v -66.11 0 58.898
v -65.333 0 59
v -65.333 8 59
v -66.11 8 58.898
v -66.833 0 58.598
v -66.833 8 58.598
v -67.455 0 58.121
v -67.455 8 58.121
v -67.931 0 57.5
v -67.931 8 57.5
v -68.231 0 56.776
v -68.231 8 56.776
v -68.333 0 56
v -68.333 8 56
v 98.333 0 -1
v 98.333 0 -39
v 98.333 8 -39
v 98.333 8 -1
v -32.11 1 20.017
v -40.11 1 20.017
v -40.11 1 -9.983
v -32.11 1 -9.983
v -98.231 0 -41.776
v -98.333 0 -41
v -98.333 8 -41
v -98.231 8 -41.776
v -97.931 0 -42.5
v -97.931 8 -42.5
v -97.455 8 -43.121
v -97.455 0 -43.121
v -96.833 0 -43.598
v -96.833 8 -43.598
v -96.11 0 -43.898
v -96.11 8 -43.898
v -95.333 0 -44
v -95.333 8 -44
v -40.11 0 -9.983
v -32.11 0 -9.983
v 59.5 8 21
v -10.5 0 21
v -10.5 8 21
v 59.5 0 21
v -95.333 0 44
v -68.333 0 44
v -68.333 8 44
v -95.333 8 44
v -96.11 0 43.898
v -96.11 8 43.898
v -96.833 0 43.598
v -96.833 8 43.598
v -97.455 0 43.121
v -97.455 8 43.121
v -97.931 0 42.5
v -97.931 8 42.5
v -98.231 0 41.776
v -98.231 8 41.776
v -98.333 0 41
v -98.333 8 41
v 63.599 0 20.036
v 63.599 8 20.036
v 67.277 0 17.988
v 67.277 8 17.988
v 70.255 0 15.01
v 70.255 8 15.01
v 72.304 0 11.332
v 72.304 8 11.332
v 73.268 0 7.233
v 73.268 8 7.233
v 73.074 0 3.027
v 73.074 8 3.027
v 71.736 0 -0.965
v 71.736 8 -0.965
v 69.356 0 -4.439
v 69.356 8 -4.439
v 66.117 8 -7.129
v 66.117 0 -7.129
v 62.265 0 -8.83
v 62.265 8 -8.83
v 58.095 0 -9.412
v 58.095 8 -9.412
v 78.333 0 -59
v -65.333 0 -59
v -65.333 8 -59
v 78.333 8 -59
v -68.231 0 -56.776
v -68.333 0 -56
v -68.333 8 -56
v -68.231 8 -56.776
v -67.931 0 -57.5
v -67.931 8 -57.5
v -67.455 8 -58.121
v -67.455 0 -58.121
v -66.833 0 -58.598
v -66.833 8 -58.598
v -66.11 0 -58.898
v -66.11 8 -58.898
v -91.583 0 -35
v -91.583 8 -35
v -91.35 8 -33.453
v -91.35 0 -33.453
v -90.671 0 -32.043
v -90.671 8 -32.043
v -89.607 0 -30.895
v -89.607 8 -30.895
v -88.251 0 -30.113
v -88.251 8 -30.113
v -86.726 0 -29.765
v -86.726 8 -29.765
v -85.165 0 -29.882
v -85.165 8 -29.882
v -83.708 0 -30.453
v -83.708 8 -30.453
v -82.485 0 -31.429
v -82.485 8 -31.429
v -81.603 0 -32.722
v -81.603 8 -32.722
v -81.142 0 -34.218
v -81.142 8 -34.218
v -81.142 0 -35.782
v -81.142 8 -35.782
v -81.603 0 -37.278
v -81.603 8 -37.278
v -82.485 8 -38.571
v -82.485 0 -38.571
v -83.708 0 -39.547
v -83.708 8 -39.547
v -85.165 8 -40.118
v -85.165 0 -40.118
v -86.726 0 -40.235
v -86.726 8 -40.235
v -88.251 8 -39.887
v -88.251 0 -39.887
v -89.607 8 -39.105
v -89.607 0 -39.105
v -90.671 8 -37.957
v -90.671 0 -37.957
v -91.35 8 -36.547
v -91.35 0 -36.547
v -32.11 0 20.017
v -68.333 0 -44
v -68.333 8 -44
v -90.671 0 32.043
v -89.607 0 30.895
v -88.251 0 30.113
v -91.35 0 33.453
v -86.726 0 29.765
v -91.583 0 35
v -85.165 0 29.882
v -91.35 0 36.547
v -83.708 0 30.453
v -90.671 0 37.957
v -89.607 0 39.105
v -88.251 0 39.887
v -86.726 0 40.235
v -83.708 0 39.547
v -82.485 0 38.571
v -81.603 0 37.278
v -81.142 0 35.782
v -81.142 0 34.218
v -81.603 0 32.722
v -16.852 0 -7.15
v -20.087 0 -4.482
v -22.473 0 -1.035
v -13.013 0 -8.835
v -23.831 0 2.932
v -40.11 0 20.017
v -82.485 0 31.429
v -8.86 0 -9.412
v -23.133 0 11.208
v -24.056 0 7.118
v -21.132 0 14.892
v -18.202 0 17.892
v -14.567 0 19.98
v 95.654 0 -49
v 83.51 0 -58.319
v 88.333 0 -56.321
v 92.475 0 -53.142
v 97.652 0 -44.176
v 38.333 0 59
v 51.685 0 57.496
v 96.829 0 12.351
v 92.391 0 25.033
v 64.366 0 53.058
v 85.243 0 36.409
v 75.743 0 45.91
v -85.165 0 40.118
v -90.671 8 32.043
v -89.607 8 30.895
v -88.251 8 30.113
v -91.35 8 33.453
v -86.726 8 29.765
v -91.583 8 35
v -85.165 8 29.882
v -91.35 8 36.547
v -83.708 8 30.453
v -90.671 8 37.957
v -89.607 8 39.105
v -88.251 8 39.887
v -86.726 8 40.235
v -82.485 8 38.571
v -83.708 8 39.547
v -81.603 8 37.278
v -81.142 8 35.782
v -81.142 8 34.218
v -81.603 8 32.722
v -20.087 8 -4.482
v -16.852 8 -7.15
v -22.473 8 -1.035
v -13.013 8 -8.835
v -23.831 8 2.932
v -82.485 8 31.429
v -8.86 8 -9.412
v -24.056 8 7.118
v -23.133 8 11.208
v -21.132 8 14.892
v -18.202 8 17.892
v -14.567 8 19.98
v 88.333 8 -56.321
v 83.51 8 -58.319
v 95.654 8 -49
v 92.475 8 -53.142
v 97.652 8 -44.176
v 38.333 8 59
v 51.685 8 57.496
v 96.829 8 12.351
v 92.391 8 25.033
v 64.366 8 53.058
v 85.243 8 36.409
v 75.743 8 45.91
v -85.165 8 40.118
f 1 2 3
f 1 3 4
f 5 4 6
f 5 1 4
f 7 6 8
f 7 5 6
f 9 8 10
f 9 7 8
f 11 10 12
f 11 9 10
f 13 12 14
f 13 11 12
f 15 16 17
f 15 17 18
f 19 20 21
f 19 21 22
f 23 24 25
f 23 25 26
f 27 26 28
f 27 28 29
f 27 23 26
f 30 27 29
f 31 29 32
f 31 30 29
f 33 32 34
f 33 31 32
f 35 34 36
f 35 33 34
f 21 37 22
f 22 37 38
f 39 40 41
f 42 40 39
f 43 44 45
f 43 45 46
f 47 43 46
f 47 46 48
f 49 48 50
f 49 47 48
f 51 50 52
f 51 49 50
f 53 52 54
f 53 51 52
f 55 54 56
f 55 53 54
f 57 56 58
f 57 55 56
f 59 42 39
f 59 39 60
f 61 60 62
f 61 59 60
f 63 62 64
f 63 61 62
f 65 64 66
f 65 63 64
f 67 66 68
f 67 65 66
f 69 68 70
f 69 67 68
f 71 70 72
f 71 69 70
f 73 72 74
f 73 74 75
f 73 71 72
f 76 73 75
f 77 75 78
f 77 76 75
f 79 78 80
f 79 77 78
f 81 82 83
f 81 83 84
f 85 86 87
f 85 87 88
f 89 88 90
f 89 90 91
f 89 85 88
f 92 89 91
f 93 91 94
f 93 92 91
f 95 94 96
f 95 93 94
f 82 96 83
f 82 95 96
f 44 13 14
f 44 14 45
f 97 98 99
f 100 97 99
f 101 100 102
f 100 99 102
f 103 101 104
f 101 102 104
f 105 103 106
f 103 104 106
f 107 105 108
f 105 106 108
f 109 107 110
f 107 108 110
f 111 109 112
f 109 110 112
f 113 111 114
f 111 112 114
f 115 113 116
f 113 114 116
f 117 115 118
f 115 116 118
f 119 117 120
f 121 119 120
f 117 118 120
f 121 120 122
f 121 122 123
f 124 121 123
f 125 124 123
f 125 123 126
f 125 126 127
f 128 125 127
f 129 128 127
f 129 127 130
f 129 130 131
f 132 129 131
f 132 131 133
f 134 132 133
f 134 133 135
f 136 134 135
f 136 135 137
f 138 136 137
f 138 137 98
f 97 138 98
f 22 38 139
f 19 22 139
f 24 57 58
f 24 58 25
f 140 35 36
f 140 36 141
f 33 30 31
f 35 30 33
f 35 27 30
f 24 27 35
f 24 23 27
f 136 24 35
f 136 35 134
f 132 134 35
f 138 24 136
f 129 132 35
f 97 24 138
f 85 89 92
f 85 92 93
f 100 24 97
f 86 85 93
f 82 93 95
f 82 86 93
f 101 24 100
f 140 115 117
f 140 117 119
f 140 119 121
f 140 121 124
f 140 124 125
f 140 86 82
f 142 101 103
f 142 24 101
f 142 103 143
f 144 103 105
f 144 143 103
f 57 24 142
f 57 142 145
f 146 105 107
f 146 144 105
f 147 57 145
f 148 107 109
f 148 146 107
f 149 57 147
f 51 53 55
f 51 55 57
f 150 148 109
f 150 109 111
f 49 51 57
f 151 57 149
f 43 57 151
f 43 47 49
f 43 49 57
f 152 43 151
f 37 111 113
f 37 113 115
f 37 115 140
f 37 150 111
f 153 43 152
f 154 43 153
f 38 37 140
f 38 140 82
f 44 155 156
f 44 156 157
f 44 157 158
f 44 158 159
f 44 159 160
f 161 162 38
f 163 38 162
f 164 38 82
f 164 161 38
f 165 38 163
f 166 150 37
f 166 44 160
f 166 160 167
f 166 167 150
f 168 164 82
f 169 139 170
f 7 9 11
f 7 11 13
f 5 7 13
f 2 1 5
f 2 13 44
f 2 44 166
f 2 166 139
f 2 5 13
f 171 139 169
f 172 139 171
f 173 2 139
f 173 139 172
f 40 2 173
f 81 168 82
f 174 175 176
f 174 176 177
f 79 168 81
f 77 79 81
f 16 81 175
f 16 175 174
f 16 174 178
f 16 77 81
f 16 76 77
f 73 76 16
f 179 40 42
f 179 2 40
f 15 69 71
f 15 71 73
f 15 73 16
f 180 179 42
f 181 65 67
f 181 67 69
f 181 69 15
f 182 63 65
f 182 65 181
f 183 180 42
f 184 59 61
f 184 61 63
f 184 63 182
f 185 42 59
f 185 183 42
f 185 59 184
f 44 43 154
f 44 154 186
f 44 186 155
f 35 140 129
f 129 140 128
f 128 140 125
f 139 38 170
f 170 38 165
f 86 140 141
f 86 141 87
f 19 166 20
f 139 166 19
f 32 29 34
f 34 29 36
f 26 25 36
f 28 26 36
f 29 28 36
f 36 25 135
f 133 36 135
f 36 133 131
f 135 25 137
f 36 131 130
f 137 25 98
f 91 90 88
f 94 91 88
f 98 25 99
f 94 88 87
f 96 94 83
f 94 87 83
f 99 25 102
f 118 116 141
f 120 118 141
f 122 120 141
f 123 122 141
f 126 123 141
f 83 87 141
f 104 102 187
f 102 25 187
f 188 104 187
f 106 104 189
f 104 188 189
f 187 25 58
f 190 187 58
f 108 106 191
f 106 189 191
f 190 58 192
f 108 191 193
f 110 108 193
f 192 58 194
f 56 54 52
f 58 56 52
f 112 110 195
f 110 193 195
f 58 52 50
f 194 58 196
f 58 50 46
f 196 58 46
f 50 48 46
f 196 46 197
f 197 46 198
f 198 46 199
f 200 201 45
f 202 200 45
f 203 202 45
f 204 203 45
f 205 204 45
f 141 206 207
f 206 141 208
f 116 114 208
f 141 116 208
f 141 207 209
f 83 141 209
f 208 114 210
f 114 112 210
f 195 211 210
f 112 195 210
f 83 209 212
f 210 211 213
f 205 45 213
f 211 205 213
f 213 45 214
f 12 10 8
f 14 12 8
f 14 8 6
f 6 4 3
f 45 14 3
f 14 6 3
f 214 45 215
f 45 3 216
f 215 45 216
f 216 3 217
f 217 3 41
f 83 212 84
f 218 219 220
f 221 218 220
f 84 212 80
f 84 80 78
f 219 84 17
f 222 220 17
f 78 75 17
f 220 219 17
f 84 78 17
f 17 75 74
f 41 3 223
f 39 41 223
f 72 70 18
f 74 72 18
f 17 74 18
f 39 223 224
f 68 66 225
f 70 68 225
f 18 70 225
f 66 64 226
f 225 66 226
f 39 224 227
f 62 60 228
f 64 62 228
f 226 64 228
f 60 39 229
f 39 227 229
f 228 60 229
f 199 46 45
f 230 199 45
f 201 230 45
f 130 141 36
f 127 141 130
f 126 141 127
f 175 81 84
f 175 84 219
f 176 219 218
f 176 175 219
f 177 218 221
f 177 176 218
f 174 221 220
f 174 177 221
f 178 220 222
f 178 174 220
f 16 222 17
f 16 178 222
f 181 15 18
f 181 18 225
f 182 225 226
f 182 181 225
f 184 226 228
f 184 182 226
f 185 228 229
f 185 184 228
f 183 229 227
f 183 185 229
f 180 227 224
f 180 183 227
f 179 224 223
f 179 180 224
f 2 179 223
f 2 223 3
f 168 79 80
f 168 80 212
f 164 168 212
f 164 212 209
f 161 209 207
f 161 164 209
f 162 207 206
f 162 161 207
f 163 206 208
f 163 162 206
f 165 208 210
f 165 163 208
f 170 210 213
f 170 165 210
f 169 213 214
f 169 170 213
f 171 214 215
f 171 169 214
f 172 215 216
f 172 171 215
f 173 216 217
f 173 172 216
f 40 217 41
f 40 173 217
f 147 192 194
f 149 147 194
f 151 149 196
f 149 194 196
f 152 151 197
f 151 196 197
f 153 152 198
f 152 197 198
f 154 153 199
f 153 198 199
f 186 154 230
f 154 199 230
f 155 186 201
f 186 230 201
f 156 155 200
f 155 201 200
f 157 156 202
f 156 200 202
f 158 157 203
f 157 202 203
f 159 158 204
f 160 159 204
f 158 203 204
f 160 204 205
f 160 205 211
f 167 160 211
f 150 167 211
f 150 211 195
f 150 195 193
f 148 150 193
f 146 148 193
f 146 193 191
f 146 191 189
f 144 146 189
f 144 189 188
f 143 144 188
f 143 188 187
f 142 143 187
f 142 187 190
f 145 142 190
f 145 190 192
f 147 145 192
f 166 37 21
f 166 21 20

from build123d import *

# Parameters (mm, degrees)
F1_DEPTH = 8
F3_D     = 10.5
F4_W     = 8
F4_H     = 30
F5_DEPTH = 1


with BuildPart() as f1:
    # F0 (on Front) → F1 (new body)
    with BuildSketch(Plane.XZ):
        with BuildLine():
            Line((-65.3333333333, -59), (78.3333333333, -59))
            ThreePointArc((78.3333333333, -59), (92.4754689571, -53.1421356237), (98.3333333333, -39))
            Line((98.3333333333, -39), (98.3333333333, -1))
            ThreePointArc((98.3333333333, -1), (80.7597402045, 41.4264068712), (38.3333333333, 59))
            Line((38.3333333333, 59), (-65.3333333333, 59))
            ThreePointArc((-65.3333333333, 59), (-67.4546536769, 58.1213203436), (-68.3333333333, 56))
            Line((-68.3333333333, 56), (-68.3333333333, 44))
            Line((-68.3333333333, 44), (-95.3333333333, 44))
            ThreePointArc((-95.3333333333, 44), (-97.4546536769, 43.1213203436), (-98.3333333333, 41))
            Line((-98.3333333333, 41), (-98.3333333333, -41))
            ThreePointArc((-98.3333333333, -41), (-97.4546536769, -43.1213203436), (-95.3333333333, -44))
            Line((-95.3333333333, -44), (-68.3333333333, -44))
            Line((-68.3333333333, -44), (-68.3333333333, -56))
            ThreePointArc((-68.3333333333, -56), (-67.4546536769, -58.1213203436), (-65.3333333333, -59))
        make_face()
        with BuildLine():
            ThreePointArc((-8.8602150538, -9.4115832066), (-24.0880948126, 5.0173333325), (-10.5, 21))
            Line((-10.5, 21), (59.5, 21))
            ThreePointArc((59.5, 21), (73.3170992075, 5.1234555789), (58.0950907734, -9.4115832066))
            Line((58.0950907734, -9.4115832066), (-8.8602150538, -9.4115832066))
        make_face(mode=Mode.SUBTRACT)
    extrude(amount=-F1_DEPTH)

    # F3 (through all)
    with Locations(Plane.XZ):
        with Locations((-86.3333333333, 35), (-86.3333333333, -35)):
            Hole(F3_D / 2)

    # F4 (on face) → F5 (cut)
    with BuildSketch(Plane.XZ):
        with Locations((-36.1102150538, 5.0173333325)):
            Rectangle(F4_W, F4_H)
    extrude(amount=-F5_DEPTH, mode=Mode.SUBTRACT)


solid = f1.part
